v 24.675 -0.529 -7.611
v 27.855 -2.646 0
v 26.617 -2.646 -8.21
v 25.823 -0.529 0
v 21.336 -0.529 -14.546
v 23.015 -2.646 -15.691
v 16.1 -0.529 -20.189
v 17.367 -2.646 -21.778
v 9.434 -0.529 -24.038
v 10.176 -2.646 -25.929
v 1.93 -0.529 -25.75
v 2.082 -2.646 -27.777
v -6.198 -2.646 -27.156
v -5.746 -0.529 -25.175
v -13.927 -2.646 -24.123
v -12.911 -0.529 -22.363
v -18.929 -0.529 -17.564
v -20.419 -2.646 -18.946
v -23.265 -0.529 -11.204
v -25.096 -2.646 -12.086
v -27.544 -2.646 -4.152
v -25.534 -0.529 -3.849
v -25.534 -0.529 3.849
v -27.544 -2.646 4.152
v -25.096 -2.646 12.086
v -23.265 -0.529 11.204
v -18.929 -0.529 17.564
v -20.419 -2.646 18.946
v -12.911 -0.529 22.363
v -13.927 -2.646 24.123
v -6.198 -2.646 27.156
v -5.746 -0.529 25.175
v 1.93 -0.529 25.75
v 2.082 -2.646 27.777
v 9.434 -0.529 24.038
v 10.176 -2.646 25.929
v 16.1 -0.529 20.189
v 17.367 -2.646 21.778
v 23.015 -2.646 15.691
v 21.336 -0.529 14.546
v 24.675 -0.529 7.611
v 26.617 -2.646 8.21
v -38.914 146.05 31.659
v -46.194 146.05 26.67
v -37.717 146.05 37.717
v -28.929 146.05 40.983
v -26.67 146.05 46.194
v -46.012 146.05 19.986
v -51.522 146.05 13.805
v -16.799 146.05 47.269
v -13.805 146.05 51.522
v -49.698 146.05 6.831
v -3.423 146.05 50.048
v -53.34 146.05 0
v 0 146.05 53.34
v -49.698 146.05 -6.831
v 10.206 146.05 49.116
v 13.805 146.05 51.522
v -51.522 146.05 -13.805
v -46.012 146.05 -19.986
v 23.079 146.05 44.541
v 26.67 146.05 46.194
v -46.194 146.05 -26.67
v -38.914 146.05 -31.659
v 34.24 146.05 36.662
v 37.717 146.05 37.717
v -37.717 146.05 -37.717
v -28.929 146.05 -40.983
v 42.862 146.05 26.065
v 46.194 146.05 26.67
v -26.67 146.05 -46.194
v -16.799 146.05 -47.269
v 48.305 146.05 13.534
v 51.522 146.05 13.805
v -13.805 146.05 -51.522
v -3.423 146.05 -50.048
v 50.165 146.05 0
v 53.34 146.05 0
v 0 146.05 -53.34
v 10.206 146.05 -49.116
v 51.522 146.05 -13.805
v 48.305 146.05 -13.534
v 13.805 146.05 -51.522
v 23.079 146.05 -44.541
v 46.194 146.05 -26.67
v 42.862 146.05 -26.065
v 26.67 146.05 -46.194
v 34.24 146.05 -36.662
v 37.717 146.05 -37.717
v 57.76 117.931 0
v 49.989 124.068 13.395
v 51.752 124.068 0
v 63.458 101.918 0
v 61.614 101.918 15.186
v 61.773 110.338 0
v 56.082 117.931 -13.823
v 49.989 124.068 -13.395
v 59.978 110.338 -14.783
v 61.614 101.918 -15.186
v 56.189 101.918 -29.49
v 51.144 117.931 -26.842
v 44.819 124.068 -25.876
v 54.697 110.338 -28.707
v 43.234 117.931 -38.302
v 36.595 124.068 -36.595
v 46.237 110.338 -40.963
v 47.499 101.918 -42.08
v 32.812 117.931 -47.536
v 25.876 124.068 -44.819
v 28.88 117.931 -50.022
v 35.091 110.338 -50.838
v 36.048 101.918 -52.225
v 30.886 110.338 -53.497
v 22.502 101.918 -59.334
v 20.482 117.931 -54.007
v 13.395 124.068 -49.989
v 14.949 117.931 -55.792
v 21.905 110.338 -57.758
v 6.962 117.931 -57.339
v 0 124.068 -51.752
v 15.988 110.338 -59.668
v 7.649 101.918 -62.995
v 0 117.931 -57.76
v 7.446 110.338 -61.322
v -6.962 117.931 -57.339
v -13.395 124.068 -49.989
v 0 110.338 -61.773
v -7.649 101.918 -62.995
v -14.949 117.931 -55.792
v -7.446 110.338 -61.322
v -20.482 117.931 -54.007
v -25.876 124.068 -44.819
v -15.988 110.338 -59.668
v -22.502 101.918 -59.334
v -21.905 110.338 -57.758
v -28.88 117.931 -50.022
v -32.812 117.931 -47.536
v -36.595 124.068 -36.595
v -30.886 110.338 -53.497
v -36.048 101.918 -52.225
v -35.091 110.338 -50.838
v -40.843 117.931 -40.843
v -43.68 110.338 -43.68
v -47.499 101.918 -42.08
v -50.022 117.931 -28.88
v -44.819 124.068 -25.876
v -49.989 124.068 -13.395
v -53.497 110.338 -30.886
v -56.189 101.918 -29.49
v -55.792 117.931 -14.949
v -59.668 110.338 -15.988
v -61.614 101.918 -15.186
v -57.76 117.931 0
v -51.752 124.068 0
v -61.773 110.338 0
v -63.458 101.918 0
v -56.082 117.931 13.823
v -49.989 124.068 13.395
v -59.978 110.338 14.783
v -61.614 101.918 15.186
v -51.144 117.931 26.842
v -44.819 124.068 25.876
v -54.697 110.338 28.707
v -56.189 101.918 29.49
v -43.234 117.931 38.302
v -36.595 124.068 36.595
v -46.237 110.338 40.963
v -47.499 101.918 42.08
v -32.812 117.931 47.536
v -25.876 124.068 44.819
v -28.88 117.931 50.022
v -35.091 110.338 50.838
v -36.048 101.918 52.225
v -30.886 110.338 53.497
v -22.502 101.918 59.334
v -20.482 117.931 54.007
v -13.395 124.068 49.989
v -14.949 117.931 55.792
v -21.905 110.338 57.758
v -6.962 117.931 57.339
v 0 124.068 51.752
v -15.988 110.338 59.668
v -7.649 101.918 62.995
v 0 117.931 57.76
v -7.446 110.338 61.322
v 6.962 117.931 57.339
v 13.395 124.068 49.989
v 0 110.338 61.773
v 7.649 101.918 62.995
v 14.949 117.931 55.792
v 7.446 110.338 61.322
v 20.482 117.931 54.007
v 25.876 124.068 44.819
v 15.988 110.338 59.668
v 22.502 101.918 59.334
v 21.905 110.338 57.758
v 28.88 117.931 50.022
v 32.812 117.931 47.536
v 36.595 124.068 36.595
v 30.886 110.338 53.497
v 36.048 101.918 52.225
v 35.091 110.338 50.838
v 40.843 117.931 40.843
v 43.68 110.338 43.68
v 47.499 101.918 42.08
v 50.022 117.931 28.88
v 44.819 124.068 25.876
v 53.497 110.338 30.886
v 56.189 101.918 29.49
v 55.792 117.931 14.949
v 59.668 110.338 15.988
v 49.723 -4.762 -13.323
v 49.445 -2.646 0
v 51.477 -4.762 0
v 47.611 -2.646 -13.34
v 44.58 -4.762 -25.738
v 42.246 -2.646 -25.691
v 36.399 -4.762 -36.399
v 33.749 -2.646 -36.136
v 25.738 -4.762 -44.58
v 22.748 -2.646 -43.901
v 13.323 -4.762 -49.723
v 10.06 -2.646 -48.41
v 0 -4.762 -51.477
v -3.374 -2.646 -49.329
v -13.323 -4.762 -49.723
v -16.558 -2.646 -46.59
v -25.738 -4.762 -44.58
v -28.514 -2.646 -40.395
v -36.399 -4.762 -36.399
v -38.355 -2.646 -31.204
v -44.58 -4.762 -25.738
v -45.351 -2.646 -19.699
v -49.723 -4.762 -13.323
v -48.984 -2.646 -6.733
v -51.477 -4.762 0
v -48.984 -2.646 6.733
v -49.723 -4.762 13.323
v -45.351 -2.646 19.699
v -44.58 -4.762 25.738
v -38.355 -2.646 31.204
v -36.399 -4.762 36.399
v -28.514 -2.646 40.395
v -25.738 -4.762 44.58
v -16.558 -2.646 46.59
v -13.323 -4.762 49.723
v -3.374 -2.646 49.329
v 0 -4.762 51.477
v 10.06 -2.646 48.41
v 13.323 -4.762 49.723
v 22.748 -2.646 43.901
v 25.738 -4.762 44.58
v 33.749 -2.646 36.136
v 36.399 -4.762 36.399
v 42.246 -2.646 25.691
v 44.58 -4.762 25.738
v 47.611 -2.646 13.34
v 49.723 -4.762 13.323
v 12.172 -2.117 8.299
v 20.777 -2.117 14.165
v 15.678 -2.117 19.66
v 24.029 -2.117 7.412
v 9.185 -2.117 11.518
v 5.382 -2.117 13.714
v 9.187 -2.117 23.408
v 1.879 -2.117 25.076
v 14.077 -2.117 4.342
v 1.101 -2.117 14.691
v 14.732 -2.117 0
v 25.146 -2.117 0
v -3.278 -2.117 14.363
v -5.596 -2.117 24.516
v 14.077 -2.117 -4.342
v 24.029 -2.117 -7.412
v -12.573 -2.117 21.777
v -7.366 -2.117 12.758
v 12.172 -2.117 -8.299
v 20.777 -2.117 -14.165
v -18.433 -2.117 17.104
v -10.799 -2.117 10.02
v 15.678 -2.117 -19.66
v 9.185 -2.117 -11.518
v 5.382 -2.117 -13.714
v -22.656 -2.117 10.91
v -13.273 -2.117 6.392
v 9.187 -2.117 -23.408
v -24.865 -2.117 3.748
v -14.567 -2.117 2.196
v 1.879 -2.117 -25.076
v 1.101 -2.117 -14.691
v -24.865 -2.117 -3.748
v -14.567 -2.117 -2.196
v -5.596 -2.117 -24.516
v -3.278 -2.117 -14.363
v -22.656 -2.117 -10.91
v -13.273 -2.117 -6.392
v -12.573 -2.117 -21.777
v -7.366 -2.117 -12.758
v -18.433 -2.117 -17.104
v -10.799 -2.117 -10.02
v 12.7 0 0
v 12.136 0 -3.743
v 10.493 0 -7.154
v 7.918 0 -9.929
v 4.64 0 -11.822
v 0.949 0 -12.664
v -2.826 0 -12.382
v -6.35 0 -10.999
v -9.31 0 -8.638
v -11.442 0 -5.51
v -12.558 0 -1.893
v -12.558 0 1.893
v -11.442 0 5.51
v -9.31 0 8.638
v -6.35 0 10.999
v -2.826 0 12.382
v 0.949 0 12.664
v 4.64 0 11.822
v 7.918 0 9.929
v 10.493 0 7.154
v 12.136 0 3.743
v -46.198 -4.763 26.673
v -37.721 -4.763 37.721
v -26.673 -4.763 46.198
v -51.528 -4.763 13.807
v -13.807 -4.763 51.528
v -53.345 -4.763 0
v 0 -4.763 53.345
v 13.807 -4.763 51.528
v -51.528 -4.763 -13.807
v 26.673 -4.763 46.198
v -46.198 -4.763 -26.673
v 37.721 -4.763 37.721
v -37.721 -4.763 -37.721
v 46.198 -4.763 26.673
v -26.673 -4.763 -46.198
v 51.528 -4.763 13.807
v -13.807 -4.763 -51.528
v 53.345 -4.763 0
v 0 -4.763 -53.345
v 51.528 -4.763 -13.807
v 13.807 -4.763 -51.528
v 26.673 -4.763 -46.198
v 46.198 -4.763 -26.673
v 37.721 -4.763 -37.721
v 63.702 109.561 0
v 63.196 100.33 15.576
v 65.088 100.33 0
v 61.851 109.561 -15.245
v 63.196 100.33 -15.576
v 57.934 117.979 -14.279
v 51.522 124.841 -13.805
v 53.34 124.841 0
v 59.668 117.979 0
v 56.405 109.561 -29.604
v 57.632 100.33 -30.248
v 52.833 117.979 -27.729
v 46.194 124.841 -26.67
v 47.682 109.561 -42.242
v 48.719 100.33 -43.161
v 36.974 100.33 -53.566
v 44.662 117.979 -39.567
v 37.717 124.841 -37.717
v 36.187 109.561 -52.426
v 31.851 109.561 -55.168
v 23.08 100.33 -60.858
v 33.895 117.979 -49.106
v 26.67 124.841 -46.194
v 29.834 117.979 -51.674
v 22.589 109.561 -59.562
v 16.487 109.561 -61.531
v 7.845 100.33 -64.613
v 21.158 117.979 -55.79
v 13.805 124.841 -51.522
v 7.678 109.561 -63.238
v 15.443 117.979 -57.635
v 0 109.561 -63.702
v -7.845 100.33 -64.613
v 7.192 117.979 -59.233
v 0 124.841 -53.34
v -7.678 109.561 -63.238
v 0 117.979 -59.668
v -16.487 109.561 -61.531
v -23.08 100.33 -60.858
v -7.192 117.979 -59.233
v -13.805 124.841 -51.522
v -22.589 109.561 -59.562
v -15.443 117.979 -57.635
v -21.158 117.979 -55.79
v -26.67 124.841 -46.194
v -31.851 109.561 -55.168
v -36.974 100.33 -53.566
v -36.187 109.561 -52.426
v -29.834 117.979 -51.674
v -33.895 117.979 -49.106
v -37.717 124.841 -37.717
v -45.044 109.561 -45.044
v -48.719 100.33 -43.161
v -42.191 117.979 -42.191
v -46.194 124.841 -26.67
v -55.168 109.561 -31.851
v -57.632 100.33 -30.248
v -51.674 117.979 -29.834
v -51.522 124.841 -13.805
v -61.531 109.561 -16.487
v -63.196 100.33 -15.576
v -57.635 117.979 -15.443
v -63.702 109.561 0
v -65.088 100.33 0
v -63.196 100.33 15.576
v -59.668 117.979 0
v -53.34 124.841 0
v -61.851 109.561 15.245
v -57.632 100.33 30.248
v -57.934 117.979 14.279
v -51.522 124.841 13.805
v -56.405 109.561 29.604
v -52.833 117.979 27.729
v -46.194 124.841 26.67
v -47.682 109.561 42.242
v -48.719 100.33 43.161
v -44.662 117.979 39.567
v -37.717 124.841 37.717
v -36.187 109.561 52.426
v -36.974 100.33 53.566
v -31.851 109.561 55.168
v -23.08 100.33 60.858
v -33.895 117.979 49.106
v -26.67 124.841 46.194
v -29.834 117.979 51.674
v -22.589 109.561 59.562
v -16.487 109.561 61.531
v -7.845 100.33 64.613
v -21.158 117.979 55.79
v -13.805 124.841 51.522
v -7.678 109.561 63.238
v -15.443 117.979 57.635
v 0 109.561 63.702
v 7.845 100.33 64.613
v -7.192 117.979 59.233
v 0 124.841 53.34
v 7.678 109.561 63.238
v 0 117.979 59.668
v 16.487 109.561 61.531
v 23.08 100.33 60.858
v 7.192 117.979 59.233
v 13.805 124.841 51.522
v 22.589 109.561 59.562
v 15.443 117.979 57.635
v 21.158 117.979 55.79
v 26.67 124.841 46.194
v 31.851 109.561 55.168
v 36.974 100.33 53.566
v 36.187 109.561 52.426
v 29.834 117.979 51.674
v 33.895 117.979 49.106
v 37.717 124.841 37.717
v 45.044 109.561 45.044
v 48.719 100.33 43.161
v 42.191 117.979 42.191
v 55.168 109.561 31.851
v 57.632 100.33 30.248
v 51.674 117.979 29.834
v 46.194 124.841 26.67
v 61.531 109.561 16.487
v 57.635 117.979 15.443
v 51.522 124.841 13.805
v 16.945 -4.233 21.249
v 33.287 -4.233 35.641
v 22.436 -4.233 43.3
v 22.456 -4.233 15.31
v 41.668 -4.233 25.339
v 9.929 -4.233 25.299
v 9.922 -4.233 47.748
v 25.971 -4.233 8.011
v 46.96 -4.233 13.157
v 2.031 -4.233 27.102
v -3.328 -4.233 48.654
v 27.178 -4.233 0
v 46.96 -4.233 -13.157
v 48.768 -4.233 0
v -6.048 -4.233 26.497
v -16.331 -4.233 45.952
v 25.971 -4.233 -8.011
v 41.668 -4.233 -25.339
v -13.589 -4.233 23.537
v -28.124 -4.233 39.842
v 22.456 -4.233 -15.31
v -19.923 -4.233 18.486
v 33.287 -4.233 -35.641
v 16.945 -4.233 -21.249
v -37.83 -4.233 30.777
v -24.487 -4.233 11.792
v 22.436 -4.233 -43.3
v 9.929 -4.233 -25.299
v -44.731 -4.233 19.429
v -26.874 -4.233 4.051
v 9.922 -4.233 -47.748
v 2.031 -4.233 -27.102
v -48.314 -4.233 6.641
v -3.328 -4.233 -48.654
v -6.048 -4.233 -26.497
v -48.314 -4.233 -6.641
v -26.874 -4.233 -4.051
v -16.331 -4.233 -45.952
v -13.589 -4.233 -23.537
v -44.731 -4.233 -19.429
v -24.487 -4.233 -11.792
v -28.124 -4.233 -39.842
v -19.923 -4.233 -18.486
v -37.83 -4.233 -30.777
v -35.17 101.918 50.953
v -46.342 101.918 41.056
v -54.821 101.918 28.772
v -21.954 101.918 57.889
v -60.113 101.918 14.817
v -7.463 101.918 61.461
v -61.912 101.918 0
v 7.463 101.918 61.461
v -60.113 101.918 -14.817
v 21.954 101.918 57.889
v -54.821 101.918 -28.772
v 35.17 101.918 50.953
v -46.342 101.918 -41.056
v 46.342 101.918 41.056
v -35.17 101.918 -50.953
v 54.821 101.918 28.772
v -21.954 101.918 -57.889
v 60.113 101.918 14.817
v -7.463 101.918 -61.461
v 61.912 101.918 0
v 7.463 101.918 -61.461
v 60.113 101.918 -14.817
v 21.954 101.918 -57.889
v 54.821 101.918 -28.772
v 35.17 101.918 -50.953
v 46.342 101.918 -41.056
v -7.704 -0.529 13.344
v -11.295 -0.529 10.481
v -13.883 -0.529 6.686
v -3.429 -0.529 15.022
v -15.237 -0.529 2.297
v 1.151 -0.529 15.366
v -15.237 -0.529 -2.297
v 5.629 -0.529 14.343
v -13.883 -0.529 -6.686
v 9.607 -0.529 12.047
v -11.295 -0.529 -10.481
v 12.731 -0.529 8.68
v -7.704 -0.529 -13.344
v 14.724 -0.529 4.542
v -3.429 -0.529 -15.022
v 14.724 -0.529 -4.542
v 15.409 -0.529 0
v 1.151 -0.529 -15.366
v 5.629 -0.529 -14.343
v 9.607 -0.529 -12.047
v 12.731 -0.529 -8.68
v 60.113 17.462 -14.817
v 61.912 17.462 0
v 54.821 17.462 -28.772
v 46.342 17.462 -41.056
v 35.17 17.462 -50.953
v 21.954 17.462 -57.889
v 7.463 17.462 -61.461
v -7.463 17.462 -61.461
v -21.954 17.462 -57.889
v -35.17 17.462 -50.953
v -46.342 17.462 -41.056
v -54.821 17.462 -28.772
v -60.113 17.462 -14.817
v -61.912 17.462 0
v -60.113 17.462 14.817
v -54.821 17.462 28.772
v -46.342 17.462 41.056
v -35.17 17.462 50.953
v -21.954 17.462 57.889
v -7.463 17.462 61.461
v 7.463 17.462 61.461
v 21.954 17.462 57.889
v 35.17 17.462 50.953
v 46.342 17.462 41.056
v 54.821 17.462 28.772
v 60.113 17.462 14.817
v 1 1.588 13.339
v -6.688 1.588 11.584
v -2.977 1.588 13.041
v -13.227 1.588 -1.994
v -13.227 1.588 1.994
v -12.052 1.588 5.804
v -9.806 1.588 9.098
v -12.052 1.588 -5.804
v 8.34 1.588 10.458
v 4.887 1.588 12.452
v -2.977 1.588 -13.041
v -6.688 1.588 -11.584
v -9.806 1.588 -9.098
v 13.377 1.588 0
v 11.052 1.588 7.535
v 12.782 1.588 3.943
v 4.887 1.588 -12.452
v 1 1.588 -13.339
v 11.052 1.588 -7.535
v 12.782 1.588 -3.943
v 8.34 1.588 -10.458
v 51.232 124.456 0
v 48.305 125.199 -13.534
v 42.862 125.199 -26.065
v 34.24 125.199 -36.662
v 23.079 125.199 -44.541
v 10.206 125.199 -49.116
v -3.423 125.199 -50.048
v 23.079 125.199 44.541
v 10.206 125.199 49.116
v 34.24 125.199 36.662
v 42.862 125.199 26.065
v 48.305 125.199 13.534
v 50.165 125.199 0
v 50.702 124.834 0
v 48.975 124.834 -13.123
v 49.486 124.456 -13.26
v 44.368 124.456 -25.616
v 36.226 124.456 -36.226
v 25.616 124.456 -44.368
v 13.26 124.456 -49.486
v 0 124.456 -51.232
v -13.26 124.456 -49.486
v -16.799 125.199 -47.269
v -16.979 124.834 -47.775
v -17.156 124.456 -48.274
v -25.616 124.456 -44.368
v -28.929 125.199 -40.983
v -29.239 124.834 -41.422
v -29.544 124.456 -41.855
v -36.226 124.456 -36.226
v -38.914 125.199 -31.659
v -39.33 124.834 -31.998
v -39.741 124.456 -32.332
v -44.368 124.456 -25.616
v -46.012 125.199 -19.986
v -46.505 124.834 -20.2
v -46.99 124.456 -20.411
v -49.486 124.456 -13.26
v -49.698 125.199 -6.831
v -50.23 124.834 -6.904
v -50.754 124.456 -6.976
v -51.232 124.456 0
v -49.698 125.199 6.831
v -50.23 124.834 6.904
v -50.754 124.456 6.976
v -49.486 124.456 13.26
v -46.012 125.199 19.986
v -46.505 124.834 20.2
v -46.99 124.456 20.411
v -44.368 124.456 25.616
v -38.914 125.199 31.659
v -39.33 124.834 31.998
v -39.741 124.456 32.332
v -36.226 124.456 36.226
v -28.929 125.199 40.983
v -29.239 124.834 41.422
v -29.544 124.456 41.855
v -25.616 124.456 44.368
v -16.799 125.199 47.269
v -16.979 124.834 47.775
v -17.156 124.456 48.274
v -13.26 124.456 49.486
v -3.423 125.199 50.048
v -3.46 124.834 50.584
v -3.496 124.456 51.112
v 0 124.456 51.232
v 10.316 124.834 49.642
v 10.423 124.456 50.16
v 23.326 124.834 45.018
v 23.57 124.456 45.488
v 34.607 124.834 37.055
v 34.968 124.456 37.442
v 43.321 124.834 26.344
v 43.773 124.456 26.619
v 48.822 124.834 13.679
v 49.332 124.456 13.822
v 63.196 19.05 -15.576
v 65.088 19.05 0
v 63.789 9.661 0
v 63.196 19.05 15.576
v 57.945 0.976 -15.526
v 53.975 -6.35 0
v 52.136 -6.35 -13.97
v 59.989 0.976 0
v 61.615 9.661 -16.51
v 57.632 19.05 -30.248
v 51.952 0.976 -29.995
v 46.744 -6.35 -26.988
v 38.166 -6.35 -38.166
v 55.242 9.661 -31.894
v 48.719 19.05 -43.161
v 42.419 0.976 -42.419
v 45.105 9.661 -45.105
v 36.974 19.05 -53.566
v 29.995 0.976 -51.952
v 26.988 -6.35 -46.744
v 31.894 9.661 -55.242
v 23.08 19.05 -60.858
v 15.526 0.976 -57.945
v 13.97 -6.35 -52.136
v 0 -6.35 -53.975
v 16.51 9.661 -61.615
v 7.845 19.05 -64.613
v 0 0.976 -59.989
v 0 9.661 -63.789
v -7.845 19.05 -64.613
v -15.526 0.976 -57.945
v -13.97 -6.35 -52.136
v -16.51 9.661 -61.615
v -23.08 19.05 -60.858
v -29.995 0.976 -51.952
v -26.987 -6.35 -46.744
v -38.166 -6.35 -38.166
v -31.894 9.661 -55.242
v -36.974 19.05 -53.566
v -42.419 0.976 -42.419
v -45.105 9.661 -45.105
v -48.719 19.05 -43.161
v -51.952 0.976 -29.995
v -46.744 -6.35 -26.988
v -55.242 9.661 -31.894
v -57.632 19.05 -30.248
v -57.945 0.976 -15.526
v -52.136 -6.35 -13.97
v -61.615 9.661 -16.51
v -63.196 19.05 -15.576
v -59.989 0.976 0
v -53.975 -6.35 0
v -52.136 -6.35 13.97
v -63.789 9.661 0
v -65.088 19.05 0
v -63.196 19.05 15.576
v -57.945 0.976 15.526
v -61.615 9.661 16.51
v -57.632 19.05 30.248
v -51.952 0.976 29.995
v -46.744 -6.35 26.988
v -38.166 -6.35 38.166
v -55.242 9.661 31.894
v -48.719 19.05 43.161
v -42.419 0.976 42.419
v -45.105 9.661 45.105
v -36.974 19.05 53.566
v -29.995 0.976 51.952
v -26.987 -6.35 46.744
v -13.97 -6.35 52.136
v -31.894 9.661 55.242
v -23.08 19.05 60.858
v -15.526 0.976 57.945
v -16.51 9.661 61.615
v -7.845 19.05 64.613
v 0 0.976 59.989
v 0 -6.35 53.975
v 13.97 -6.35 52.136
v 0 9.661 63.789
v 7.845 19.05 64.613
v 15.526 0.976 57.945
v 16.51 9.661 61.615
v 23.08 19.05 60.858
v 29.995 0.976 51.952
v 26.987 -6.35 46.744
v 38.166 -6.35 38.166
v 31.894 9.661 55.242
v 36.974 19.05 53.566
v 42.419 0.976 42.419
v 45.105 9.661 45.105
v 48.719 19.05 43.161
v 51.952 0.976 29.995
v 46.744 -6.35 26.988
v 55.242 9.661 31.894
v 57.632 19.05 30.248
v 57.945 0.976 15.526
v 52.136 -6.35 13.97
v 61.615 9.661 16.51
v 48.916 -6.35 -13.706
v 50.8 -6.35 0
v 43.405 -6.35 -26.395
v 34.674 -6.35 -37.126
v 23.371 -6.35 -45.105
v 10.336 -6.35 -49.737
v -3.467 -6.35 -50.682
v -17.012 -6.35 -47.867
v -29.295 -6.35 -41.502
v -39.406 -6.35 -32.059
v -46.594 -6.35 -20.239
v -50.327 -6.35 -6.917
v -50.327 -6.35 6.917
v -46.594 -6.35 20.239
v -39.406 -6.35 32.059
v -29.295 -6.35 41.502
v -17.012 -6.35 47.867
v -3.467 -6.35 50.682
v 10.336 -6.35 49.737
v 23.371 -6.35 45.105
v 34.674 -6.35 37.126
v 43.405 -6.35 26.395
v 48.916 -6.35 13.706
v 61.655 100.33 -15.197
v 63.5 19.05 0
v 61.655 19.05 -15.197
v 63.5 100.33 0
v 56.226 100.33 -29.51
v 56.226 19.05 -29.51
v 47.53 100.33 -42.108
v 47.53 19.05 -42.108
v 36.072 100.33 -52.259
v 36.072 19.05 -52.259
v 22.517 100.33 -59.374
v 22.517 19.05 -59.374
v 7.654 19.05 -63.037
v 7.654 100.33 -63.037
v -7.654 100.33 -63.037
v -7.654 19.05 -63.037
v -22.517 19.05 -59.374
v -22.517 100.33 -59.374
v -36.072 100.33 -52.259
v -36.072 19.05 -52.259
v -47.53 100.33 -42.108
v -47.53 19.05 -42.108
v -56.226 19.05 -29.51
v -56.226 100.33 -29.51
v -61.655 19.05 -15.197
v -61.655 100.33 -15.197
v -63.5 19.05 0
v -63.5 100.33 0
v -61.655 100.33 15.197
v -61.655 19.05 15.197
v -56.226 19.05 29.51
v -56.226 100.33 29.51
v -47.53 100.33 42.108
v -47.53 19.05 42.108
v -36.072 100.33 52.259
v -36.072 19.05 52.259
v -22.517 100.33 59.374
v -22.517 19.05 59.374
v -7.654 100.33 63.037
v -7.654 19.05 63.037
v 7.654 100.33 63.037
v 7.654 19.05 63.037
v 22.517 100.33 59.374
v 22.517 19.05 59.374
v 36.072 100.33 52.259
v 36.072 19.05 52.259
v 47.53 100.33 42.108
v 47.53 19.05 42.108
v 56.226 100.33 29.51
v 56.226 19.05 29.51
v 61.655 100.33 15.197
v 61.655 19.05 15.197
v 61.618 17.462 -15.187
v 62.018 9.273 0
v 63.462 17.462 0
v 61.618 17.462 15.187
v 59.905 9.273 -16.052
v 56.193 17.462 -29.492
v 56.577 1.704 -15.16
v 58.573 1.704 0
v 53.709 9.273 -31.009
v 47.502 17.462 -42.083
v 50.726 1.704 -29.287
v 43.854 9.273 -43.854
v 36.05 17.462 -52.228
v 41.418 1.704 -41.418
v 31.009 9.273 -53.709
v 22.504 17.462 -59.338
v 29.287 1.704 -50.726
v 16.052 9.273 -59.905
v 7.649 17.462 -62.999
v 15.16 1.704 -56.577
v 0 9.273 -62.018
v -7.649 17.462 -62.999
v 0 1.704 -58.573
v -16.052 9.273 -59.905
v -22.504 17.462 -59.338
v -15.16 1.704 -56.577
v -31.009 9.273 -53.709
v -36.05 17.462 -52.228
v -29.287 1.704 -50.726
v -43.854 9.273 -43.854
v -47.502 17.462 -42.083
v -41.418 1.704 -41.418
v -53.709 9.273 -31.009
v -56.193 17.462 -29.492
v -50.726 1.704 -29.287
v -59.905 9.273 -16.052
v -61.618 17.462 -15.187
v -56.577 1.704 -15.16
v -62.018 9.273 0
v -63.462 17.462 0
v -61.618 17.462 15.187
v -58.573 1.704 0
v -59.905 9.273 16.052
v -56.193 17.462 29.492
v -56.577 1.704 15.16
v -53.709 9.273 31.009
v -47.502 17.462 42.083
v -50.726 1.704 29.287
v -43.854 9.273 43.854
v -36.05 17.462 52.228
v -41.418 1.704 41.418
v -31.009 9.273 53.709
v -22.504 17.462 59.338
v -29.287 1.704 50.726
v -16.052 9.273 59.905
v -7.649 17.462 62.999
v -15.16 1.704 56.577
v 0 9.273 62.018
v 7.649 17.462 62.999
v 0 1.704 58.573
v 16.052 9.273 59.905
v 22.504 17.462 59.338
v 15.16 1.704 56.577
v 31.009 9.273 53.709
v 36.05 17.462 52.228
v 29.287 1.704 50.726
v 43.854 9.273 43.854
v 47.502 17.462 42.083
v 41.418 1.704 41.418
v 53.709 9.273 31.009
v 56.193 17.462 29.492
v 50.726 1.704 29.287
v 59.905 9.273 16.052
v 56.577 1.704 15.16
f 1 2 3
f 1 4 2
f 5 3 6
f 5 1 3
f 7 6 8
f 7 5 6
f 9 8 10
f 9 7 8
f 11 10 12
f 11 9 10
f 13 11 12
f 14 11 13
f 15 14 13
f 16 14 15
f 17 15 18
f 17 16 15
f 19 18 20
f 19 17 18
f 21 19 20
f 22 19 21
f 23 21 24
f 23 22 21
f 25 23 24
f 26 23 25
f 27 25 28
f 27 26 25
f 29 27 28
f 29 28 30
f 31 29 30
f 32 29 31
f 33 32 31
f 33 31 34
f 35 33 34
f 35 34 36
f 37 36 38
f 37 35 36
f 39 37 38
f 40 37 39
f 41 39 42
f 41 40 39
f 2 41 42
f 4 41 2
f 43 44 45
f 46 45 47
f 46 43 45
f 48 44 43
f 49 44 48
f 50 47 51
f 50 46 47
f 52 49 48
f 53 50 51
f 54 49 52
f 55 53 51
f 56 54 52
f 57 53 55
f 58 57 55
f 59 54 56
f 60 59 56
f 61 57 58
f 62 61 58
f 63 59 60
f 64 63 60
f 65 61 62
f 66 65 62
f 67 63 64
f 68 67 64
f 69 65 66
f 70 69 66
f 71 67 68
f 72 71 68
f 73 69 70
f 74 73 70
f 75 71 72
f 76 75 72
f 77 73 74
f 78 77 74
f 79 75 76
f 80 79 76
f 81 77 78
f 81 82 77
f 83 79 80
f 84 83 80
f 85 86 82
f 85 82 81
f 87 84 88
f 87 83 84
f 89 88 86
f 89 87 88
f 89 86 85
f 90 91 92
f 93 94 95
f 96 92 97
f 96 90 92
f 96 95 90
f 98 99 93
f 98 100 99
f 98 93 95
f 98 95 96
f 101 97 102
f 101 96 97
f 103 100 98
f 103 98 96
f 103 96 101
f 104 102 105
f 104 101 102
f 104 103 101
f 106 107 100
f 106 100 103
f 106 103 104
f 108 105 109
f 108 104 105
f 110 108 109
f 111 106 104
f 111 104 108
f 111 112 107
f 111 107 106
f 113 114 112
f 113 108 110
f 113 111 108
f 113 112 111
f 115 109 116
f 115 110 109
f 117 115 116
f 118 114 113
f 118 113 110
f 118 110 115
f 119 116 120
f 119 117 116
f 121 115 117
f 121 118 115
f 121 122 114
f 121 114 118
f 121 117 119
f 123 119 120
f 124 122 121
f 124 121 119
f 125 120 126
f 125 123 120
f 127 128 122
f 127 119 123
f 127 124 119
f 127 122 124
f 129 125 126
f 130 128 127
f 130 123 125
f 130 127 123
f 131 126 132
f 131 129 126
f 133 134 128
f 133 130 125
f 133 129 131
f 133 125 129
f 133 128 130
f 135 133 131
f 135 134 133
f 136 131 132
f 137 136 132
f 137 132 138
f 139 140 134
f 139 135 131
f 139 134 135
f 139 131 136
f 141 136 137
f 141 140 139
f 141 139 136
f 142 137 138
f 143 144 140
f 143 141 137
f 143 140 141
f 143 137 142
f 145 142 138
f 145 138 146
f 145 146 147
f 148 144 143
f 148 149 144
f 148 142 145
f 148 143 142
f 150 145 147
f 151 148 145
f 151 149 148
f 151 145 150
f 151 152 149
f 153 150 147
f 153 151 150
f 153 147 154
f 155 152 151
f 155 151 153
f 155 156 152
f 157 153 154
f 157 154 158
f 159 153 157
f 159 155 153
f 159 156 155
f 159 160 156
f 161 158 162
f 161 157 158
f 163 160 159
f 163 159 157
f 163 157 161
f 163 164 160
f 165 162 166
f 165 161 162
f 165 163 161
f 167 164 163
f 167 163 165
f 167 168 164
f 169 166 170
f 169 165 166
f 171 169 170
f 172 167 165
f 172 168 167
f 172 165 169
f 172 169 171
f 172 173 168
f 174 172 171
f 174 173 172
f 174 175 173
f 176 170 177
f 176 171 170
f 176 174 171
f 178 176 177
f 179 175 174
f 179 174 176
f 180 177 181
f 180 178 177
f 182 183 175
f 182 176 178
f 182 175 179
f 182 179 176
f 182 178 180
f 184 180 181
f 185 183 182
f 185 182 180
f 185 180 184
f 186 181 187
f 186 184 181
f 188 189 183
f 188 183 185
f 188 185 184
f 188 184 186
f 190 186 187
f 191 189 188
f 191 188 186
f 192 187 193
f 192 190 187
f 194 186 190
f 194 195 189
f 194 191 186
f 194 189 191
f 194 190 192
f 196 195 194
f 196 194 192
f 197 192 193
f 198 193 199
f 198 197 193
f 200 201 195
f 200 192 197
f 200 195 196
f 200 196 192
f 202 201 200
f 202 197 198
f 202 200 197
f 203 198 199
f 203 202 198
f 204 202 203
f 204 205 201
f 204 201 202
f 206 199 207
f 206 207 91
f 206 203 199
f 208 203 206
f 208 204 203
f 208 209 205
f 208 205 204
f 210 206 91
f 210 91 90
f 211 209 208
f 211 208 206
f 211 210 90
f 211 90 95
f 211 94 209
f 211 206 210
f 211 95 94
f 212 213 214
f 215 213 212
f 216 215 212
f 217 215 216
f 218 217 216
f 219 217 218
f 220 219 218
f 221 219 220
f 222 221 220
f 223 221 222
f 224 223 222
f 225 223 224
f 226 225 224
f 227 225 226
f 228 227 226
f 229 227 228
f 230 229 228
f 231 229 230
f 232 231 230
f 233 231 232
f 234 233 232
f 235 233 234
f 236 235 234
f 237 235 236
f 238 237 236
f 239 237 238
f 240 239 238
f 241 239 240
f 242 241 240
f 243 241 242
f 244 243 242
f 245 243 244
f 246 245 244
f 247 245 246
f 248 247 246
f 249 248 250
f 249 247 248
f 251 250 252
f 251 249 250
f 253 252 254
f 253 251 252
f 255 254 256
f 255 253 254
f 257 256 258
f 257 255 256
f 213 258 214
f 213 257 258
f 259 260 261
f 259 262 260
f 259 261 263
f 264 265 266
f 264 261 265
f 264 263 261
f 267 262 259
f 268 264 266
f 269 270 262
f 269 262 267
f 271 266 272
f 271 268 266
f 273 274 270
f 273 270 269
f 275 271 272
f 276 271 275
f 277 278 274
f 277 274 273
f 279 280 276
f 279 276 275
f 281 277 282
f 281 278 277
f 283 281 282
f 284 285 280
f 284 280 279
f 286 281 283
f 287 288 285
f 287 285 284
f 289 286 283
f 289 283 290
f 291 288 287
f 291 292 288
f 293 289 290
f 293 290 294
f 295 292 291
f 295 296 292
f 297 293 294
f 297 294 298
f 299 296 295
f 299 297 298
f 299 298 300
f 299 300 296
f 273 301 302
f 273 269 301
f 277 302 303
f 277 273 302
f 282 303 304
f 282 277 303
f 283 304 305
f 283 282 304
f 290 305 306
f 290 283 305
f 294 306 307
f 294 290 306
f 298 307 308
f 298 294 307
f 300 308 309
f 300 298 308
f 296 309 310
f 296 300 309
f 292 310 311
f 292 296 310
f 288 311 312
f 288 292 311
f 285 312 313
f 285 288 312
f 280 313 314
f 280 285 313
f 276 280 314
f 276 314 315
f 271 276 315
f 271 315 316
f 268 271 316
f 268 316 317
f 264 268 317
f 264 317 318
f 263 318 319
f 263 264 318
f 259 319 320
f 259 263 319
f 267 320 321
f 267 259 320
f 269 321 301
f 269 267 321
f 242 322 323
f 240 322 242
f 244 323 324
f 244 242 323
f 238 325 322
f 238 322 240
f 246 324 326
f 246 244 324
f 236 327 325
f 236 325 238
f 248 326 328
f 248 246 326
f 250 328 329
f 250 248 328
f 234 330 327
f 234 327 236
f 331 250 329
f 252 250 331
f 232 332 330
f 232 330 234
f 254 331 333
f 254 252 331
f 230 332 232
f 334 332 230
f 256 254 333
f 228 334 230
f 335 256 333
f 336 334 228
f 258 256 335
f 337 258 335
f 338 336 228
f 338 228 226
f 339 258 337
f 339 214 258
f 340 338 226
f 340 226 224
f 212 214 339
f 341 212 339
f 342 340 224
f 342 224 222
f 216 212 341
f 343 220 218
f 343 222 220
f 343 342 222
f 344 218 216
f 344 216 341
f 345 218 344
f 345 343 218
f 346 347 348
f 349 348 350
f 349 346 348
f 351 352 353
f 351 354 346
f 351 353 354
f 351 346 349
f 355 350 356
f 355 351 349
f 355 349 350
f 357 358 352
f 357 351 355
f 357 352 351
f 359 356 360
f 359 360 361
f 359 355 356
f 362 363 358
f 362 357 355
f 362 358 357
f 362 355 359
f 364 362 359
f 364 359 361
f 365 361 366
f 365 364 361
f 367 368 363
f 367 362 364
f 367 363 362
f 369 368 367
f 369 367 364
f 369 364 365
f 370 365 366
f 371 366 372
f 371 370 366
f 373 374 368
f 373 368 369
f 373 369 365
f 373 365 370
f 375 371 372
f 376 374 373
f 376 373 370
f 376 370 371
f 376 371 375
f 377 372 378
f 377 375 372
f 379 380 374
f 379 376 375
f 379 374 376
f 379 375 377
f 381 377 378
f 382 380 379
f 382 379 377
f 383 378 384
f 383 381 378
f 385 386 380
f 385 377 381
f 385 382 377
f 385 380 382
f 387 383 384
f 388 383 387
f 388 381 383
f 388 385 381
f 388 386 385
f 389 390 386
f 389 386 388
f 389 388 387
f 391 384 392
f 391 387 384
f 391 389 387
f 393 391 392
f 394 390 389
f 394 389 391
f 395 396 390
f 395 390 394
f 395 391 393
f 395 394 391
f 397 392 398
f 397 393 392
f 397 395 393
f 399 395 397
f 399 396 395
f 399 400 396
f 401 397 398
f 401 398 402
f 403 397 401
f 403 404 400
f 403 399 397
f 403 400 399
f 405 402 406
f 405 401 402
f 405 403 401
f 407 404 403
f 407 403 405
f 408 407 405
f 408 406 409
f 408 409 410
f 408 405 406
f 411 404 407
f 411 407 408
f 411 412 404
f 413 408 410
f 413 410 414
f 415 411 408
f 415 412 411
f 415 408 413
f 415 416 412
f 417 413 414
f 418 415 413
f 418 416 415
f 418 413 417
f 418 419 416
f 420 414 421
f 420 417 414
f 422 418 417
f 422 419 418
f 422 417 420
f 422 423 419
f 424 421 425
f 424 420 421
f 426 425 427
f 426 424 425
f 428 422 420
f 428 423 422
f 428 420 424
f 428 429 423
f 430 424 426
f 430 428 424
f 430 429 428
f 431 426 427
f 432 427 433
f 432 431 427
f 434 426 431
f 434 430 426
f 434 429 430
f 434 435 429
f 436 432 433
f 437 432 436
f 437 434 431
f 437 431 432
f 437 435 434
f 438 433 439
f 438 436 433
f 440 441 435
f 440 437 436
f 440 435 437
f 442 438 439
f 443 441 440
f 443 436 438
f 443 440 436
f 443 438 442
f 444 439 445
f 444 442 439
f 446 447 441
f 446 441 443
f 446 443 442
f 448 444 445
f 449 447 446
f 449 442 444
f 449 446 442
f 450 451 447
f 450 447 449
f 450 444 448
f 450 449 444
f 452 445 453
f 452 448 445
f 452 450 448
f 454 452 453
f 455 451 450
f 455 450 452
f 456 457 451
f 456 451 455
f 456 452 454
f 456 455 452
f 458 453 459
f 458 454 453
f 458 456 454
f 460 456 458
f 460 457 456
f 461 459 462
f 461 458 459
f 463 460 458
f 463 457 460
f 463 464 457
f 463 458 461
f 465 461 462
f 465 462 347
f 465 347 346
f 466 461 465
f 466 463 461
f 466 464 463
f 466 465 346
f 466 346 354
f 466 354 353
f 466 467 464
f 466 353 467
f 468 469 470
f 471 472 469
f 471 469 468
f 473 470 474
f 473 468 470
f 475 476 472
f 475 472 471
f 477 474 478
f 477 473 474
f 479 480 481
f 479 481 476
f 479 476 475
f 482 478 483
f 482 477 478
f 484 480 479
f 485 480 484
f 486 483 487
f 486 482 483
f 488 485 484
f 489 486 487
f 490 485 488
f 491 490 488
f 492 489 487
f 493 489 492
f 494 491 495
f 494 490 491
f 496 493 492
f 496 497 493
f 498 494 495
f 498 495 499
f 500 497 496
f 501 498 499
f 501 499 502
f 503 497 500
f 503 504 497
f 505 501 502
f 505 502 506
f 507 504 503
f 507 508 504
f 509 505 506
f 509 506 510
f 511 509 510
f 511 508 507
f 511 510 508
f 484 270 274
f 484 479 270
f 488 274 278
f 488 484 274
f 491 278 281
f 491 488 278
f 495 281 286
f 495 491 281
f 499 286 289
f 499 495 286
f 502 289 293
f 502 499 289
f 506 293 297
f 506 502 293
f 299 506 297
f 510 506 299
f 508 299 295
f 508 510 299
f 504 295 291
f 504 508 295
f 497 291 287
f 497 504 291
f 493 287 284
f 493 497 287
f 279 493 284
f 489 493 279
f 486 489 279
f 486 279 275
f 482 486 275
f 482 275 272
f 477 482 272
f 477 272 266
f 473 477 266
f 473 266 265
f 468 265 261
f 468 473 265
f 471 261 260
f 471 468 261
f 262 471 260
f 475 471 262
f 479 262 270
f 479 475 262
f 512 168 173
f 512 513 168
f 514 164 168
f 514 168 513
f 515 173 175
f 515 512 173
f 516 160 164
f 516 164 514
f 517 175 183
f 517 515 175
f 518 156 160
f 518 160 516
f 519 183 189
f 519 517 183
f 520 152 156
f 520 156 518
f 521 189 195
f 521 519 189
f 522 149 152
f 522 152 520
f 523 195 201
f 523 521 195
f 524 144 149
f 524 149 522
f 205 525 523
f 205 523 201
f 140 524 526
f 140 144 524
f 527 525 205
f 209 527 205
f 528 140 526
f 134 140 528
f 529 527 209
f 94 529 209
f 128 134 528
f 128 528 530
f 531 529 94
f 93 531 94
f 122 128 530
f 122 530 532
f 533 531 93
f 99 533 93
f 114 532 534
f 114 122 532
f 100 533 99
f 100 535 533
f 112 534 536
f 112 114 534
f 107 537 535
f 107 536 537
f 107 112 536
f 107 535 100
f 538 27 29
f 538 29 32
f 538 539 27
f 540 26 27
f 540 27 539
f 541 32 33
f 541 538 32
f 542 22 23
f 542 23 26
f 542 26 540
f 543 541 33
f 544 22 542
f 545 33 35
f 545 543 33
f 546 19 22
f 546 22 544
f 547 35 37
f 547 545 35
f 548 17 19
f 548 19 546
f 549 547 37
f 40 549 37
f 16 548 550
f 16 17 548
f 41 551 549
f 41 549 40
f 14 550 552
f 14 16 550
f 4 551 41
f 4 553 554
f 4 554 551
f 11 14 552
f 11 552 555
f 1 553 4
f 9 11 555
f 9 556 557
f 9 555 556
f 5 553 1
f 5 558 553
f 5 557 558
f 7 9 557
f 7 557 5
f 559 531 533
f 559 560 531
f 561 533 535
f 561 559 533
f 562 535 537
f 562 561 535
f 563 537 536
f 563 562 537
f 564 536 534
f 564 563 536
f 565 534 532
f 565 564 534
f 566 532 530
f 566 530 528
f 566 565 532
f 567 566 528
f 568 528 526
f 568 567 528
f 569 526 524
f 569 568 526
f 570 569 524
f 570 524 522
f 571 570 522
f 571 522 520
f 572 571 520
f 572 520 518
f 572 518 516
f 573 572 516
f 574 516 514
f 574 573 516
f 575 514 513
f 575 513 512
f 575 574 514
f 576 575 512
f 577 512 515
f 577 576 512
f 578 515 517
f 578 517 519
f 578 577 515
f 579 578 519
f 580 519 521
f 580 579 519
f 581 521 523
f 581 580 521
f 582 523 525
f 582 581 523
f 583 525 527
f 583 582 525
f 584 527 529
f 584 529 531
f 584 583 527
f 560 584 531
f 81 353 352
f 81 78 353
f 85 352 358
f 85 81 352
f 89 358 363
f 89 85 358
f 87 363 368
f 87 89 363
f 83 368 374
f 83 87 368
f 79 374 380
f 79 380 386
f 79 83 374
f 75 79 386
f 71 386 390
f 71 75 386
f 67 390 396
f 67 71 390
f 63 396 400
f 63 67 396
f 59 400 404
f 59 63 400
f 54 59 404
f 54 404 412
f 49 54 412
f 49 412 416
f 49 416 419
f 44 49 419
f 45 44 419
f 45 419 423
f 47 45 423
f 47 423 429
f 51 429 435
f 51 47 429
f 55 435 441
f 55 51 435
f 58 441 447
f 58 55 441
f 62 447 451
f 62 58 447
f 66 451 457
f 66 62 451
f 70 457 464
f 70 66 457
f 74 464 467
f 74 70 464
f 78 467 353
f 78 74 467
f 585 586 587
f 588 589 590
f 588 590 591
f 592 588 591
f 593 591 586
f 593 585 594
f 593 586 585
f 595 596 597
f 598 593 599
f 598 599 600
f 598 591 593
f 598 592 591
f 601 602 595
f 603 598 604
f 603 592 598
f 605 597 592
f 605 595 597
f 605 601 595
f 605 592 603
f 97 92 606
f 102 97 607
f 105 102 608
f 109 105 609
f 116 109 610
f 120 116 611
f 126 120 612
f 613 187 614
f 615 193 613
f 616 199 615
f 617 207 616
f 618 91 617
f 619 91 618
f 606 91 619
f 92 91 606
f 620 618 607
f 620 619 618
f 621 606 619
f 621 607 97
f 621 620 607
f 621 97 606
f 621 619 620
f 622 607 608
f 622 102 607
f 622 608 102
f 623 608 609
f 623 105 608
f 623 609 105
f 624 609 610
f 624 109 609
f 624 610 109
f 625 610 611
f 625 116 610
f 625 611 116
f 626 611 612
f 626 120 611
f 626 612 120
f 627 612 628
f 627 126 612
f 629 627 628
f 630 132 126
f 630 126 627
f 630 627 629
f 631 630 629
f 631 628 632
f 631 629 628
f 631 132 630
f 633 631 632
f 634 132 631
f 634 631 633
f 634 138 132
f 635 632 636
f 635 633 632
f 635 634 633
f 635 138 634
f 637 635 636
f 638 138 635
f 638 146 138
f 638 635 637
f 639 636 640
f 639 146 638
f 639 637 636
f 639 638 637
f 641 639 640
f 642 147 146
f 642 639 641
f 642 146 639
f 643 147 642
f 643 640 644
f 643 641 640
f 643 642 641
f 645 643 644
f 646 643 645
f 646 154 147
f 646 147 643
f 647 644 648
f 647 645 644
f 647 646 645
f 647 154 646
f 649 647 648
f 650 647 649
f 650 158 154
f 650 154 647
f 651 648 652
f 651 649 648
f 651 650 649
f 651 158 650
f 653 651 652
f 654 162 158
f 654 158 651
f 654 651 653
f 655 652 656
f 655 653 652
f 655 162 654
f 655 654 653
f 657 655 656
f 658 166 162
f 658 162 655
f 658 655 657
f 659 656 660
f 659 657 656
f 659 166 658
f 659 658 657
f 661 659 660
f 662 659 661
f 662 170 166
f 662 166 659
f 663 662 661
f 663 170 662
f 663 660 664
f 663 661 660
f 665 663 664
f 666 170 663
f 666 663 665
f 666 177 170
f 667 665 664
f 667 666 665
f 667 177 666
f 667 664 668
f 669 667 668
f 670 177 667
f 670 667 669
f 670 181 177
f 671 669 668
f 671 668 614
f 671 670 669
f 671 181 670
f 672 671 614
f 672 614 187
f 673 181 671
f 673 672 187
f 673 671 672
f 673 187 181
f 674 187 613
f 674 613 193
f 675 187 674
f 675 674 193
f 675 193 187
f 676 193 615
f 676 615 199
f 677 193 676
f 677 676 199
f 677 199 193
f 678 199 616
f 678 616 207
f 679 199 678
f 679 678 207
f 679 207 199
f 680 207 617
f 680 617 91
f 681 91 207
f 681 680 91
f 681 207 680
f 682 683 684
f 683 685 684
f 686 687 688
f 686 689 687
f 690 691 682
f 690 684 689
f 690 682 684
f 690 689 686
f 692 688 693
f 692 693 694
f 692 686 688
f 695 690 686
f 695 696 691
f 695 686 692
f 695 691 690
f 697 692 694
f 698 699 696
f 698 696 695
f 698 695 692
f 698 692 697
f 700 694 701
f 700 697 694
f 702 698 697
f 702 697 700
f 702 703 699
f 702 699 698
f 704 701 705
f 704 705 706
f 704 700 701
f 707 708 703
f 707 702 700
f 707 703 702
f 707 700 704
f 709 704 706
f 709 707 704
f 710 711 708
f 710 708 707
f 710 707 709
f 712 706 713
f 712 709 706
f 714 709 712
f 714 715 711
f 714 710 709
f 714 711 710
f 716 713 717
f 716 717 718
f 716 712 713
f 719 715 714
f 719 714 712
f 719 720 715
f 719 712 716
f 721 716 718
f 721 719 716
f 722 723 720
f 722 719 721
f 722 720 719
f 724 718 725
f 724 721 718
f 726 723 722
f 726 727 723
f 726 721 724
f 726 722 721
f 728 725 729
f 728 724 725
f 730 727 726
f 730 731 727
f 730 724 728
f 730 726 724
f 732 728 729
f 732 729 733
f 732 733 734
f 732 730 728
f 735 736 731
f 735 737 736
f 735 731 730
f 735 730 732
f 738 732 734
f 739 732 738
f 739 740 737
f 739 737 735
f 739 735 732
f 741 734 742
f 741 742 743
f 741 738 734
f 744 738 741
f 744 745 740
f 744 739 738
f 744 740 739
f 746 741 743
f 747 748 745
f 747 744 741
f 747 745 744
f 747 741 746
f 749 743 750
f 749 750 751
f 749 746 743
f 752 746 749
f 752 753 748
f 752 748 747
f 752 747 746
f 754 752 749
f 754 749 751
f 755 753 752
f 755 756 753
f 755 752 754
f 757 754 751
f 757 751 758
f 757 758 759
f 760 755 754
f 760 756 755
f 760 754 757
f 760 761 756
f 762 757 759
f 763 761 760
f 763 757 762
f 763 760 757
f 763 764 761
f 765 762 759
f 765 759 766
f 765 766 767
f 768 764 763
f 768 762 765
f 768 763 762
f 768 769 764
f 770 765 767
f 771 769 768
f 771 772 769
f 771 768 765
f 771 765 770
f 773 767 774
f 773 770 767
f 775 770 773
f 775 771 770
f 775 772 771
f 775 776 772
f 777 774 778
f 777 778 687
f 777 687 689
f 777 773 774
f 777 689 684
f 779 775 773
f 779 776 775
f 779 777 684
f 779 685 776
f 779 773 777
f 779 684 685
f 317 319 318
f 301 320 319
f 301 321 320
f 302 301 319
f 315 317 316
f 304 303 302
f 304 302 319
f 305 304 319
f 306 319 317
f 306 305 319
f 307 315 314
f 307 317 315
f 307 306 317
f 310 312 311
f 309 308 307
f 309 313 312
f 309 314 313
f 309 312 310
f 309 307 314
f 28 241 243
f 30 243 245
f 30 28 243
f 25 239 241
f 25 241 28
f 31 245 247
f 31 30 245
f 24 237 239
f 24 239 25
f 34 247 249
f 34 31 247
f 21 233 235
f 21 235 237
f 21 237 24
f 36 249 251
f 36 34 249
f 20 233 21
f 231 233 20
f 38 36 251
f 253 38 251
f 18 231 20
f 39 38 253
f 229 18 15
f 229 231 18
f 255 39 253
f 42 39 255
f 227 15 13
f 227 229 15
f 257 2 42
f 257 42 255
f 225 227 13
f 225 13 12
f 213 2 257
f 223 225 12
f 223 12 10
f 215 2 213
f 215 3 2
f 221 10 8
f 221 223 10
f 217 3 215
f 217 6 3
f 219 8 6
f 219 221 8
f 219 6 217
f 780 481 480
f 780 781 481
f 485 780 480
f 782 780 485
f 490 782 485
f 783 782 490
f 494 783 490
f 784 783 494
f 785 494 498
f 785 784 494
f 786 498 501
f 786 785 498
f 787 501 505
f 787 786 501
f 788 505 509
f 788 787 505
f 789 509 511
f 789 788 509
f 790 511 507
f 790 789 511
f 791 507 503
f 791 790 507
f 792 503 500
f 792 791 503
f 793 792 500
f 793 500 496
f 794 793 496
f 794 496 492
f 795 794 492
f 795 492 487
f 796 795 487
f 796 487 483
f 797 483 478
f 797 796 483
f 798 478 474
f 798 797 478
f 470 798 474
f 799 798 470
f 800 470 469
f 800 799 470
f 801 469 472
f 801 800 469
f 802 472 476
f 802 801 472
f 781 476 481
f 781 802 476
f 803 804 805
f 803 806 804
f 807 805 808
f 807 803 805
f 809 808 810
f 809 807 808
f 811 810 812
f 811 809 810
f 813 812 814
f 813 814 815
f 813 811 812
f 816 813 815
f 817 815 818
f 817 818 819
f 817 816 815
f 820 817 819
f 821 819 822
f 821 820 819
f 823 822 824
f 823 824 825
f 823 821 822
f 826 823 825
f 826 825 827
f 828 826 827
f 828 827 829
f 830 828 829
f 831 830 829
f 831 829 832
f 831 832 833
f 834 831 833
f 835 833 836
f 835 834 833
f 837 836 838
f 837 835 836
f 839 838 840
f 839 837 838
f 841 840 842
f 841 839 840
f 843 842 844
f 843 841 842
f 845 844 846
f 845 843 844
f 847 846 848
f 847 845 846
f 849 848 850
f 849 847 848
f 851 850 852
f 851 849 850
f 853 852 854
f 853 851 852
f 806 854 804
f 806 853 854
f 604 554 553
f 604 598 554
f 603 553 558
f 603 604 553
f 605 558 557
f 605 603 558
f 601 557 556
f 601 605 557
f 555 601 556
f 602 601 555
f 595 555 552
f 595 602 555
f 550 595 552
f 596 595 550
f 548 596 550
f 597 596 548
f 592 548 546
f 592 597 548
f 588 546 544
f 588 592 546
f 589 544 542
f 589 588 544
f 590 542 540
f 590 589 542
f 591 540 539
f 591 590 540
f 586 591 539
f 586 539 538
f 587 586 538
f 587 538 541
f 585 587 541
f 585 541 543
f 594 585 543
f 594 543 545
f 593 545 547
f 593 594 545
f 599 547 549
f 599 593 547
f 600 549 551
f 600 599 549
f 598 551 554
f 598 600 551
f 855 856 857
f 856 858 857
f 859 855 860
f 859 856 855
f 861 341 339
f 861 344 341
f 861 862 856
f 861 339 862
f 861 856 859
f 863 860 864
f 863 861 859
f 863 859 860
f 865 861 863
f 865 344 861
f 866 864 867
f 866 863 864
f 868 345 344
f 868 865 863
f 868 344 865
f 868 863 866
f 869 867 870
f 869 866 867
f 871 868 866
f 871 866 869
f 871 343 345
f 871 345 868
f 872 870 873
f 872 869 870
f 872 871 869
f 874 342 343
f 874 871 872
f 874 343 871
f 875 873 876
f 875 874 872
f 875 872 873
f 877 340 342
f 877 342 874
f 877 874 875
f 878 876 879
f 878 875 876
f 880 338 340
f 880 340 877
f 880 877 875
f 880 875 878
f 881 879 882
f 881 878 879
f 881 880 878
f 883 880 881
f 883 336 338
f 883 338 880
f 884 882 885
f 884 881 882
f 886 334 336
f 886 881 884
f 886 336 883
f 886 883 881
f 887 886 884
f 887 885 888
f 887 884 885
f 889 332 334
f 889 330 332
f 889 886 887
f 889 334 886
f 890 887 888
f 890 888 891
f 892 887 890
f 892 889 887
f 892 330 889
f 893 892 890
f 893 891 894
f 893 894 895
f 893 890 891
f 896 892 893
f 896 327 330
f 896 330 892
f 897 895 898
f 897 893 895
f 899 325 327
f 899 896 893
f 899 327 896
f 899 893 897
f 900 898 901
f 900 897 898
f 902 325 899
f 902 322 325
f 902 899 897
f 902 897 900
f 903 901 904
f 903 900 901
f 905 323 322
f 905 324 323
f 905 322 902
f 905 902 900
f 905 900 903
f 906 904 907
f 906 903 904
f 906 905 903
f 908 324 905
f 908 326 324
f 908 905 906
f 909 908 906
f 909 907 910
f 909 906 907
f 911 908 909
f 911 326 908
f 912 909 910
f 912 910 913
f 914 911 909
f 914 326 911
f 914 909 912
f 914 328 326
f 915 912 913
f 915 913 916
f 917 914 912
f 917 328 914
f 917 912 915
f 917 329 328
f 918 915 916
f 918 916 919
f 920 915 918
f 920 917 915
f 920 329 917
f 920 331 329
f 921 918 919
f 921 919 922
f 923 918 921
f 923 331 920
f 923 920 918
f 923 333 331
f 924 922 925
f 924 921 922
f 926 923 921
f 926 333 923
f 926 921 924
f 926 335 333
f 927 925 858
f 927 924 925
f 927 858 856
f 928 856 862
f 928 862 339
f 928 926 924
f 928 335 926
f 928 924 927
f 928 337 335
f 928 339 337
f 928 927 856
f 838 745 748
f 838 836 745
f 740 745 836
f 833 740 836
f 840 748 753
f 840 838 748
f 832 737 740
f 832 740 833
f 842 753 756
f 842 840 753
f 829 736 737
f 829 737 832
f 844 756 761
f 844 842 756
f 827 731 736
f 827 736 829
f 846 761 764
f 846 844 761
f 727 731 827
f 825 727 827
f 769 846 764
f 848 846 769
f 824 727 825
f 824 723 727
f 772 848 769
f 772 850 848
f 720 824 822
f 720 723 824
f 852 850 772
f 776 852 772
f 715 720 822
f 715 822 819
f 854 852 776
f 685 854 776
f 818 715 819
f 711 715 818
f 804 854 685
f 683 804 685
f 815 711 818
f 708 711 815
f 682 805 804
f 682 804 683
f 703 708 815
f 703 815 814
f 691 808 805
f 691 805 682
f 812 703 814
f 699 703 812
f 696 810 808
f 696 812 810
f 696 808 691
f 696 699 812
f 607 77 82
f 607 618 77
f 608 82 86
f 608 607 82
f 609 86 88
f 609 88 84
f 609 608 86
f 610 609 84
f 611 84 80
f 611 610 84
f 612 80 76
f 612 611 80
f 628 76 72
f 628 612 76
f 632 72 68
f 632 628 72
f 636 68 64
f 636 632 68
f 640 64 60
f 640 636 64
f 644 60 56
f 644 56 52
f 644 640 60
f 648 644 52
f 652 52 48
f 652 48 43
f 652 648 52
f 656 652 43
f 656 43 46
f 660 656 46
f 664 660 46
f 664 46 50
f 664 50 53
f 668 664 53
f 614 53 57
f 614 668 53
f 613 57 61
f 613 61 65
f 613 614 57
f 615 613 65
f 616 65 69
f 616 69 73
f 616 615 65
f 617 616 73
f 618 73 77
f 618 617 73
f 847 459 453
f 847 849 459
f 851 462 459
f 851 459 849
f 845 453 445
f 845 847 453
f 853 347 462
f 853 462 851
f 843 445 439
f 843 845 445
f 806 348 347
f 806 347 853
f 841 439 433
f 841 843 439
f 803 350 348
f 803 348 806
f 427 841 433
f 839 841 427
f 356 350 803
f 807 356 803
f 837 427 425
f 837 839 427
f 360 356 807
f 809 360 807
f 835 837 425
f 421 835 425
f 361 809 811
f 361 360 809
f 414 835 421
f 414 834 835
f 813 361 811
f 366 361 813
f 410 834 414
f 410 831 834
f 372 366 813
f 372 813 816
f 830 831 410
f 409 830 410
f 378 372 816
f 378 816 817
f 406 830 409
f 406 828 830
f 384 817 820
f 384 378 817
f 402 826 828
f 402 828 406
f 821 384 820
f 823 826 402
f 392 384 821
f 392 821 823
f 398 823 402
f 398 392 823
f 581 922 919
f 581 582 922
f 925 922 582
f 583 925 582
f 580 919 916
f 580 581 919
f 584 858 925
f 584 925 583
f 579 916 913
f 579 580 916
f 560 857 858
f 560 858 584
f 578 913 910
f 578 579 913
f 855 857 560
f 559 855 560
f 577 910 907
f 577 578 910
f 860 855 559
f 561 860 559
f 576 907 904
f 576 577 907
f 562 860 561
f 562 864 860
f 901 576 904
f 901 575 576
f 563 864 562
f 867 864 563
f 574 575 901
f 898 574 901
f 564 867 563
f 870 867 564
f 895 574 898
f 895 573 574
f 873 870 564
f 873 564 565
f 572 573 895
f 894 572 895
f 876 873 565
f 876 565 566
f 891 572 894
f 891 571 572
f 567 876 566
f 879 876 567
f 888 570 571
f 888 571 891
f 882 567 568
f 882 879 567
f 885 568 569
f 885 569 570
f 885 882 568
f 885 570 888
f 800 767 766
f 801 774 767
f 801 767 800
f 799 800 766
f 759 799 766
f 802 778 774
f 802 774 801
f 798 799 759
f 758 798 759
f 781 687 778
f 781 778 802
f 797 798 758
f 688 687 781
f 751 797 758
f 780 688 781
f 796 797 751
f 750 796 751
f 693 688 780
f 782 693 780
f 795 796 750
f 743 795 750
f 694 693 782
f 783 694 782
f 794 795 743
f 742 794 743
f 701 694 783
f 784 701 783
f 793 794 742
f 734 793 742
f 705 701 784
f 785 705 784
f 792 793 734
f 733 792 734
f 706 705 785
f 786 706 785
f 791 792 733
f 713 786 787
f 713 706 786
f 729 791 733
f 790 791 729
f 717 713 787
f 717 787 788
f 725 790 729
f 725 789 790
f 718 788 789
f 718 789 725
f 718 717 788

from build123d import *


with BuildPart() as part:
    # Sketch1 → Revolve1 (revolve)
    with BuildSketch(Plane.XY):
        with BuildLine():
            Line((0, 1.5875), (0, 0))
            Line((0, 0), (12.7, 0))
            Line((12.7, 0), (14.732, -2.116666667))
            Line((14.732, -2.116666667), (25.146, -2.116666667))
            Line((25.146, -2.116666667), (27.178, -4.233333333))
            Line((27.178, -4.233333333), (48.768, -4.233333333))
            Line((48.768, -4.233333333), (50.8, -6.35))
            Line((50.8, -6.35), (53.975, -6.35))
            ThreePointArc((53.975, -6.35), (62.187816399, 5.1877522), (65.0875, 19.05))
            Line((65.0875, 19.05), (63.5, 19.05))
            Line((63.5, 19.05), (63.5, 100.33))
            Line((63.5, 100.33), (65.0875, 100.33))
            ThreePointArc((65.0875, 100.33), (61.99894302, 113.920372302), (53.34, 124.841))
            Line((53.34, 124.841), (53.34, 146.05))
            Line((53.34, 146.05), (50.165, 146.05))
            Line((50.165, 146.05), (50.165, 125.199035015))
            ThreePointArc((50.165, 125.199035015), (50.967982729, 124.646456623), (51.7525, 124.067961338))
            ThreePointArc((51.7525, 124.067961338), (60.040796597, 114.279841026), (63.457766616, 101.9175))
            Line((63.457766616, 101.9175), (61.9125, 101.9175))
            Line((61.9125, 101.9175), (61.9125, 17.4625))
            Line((61.9125, 17.4625), (63.461790592, 17.4625))
            ThreePointArc((63.461790592, 17.4625), (60.535122298, 5.379756942), (53.345359351, -4.7625))
            Line((53.345359351, -4.7625), (51.476620878, -4.7625))
            Line((51.476620878, -4.7625), (49.444620878, -2.645833333))
            Line((49.444620878, -2.645833333), (27.854620878, -2.645833333))
            Line((27.854620878, -2.645833333), (25.822620878, -0.529166667))
            Line((25.822620878, -0.529166667), (15.408620878, -0.529166667))
            Line((15.408620878, -0.529166667), (13.376620878, 1.5875))
            Line((13.376620878, 1.5875), (1.5875, 1.5875))
            Line((1.5875, 1.5875), (0, 1.5875))
        make_face()
    revolve(axis=Axis((0, 0, 0), (0, 1, 0)))


solid = part.part
